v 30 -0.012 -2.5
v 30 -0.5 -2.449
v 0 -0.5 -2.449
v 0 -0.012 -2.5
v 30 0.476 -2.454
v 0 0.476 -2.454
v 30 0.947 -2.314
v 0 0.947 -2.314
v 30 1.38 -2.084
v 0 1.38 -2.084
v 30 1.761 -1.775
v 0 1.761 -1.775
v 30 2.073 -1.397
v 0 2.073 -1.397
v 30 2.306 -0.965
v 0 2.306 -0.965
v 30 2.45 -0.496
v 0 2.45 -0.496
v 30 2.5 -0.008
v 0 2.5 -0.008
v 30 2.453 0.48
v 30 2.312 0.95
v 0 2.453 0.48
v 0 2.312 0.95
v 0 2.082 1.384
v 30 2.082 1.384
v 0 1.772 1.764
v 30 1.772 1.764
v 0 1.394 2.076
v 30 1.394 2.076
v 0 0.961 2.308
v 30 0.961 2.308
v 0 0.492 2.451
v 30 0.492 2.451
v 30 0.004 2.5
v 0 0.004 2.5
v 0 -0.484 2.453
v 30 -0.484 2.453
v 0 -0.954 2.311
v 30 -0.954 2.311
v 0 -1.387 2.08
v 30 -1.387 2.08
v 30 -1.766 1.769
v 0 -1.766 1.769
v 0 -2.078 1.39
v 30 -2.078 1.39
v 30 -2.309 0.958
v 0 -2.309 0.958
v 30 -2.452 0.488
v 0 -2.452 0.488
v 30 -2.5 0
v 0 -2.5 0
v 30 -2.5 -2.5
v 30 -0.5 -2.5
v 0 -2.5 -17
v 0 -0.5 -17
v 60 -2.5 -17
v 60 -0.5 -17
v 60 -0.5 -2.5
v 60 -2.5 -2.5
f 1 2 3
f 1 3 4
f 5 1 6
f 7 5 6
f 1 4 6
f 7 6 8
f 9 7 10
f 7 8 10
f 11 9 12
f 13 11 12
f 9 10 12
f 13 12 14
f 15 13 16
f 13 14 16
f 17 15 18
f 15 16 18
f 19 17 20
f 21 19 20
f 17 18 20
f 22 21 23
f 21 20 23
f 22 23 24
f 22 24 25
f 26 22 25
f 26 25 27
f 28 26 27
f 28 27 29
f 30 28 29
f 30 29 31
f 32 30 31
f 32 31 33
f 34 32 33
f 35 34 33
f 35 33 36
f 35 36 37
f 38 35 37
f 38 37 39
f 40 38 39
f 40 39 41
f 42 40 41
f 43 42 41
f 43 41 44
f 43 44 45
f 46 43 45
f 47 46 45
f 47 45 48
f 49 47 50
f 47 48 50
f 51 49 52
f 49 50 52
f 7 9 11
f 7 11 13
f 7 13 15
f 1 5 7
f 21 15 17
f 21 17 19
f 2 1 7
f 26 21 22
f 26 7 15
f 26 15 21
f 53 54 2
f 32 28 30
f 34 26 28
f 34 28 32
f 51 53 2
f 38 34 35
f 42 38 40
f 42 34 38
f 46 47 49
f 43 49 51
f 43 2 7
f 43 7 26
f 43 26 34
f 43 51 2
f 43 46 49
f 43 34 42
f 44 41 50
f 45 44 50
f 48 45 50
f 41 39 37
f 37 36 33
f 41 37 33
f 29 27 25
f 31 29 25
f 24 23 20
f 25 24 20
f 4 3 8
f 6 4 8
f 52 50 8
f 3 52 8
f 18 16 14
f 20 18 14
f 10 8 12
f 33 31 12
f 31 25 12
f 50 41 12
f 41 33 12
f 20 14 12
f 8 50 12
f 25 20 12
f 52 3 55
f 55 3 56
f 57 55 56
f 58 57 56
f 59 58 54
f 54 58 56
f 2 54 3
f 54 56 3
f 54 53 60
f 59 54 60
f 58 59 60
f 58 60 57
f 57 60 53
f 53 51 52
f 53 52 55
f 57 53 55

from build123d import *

# Parameters (mm, degrees)
BOSS_EXTRUDE1_DEPTH = 60
SKETCH3_W           = 31.691445316
SKETCH3_H           = 5
CUT_EXTRUDE1_DEPTH  = 63.561969278


with BuildPart() as part:
    # Sketch1 → Boss-Extrude1 (new body)
    with BuildSketch(Plane(origin=(0, 0, 0), x_dir=(0, 0, -1), z_dir=(1, 0, 0))):
        with BuildLine():
            Line((0, -2.5), (17, -2.5))
            Line((17, -2.5), (17, -0.5))
            Line((17, -0.5), (2.449489743, -0.5))
            ThreePointArc((2.449489743, -0.5), (-1.58113883, 1.936491673), (0, -2.5))
        make_face()
    extrude(amount=BOSS_EXTRUDE1_DEPTH)

    # Sketch3 → Cut-Extrude1 (cut, through all)
    with BuildSketch(Plane.XZ.offset(2.5)):
        with Locations((45.845722658, 0)):
            Rectangle(SKETCH3_W, SKETCH3_H)
    extrude(amount=-CUT_EXTRUDE1_DEPTH, mode=Mode.SUBTRACT)


solid = part.part
